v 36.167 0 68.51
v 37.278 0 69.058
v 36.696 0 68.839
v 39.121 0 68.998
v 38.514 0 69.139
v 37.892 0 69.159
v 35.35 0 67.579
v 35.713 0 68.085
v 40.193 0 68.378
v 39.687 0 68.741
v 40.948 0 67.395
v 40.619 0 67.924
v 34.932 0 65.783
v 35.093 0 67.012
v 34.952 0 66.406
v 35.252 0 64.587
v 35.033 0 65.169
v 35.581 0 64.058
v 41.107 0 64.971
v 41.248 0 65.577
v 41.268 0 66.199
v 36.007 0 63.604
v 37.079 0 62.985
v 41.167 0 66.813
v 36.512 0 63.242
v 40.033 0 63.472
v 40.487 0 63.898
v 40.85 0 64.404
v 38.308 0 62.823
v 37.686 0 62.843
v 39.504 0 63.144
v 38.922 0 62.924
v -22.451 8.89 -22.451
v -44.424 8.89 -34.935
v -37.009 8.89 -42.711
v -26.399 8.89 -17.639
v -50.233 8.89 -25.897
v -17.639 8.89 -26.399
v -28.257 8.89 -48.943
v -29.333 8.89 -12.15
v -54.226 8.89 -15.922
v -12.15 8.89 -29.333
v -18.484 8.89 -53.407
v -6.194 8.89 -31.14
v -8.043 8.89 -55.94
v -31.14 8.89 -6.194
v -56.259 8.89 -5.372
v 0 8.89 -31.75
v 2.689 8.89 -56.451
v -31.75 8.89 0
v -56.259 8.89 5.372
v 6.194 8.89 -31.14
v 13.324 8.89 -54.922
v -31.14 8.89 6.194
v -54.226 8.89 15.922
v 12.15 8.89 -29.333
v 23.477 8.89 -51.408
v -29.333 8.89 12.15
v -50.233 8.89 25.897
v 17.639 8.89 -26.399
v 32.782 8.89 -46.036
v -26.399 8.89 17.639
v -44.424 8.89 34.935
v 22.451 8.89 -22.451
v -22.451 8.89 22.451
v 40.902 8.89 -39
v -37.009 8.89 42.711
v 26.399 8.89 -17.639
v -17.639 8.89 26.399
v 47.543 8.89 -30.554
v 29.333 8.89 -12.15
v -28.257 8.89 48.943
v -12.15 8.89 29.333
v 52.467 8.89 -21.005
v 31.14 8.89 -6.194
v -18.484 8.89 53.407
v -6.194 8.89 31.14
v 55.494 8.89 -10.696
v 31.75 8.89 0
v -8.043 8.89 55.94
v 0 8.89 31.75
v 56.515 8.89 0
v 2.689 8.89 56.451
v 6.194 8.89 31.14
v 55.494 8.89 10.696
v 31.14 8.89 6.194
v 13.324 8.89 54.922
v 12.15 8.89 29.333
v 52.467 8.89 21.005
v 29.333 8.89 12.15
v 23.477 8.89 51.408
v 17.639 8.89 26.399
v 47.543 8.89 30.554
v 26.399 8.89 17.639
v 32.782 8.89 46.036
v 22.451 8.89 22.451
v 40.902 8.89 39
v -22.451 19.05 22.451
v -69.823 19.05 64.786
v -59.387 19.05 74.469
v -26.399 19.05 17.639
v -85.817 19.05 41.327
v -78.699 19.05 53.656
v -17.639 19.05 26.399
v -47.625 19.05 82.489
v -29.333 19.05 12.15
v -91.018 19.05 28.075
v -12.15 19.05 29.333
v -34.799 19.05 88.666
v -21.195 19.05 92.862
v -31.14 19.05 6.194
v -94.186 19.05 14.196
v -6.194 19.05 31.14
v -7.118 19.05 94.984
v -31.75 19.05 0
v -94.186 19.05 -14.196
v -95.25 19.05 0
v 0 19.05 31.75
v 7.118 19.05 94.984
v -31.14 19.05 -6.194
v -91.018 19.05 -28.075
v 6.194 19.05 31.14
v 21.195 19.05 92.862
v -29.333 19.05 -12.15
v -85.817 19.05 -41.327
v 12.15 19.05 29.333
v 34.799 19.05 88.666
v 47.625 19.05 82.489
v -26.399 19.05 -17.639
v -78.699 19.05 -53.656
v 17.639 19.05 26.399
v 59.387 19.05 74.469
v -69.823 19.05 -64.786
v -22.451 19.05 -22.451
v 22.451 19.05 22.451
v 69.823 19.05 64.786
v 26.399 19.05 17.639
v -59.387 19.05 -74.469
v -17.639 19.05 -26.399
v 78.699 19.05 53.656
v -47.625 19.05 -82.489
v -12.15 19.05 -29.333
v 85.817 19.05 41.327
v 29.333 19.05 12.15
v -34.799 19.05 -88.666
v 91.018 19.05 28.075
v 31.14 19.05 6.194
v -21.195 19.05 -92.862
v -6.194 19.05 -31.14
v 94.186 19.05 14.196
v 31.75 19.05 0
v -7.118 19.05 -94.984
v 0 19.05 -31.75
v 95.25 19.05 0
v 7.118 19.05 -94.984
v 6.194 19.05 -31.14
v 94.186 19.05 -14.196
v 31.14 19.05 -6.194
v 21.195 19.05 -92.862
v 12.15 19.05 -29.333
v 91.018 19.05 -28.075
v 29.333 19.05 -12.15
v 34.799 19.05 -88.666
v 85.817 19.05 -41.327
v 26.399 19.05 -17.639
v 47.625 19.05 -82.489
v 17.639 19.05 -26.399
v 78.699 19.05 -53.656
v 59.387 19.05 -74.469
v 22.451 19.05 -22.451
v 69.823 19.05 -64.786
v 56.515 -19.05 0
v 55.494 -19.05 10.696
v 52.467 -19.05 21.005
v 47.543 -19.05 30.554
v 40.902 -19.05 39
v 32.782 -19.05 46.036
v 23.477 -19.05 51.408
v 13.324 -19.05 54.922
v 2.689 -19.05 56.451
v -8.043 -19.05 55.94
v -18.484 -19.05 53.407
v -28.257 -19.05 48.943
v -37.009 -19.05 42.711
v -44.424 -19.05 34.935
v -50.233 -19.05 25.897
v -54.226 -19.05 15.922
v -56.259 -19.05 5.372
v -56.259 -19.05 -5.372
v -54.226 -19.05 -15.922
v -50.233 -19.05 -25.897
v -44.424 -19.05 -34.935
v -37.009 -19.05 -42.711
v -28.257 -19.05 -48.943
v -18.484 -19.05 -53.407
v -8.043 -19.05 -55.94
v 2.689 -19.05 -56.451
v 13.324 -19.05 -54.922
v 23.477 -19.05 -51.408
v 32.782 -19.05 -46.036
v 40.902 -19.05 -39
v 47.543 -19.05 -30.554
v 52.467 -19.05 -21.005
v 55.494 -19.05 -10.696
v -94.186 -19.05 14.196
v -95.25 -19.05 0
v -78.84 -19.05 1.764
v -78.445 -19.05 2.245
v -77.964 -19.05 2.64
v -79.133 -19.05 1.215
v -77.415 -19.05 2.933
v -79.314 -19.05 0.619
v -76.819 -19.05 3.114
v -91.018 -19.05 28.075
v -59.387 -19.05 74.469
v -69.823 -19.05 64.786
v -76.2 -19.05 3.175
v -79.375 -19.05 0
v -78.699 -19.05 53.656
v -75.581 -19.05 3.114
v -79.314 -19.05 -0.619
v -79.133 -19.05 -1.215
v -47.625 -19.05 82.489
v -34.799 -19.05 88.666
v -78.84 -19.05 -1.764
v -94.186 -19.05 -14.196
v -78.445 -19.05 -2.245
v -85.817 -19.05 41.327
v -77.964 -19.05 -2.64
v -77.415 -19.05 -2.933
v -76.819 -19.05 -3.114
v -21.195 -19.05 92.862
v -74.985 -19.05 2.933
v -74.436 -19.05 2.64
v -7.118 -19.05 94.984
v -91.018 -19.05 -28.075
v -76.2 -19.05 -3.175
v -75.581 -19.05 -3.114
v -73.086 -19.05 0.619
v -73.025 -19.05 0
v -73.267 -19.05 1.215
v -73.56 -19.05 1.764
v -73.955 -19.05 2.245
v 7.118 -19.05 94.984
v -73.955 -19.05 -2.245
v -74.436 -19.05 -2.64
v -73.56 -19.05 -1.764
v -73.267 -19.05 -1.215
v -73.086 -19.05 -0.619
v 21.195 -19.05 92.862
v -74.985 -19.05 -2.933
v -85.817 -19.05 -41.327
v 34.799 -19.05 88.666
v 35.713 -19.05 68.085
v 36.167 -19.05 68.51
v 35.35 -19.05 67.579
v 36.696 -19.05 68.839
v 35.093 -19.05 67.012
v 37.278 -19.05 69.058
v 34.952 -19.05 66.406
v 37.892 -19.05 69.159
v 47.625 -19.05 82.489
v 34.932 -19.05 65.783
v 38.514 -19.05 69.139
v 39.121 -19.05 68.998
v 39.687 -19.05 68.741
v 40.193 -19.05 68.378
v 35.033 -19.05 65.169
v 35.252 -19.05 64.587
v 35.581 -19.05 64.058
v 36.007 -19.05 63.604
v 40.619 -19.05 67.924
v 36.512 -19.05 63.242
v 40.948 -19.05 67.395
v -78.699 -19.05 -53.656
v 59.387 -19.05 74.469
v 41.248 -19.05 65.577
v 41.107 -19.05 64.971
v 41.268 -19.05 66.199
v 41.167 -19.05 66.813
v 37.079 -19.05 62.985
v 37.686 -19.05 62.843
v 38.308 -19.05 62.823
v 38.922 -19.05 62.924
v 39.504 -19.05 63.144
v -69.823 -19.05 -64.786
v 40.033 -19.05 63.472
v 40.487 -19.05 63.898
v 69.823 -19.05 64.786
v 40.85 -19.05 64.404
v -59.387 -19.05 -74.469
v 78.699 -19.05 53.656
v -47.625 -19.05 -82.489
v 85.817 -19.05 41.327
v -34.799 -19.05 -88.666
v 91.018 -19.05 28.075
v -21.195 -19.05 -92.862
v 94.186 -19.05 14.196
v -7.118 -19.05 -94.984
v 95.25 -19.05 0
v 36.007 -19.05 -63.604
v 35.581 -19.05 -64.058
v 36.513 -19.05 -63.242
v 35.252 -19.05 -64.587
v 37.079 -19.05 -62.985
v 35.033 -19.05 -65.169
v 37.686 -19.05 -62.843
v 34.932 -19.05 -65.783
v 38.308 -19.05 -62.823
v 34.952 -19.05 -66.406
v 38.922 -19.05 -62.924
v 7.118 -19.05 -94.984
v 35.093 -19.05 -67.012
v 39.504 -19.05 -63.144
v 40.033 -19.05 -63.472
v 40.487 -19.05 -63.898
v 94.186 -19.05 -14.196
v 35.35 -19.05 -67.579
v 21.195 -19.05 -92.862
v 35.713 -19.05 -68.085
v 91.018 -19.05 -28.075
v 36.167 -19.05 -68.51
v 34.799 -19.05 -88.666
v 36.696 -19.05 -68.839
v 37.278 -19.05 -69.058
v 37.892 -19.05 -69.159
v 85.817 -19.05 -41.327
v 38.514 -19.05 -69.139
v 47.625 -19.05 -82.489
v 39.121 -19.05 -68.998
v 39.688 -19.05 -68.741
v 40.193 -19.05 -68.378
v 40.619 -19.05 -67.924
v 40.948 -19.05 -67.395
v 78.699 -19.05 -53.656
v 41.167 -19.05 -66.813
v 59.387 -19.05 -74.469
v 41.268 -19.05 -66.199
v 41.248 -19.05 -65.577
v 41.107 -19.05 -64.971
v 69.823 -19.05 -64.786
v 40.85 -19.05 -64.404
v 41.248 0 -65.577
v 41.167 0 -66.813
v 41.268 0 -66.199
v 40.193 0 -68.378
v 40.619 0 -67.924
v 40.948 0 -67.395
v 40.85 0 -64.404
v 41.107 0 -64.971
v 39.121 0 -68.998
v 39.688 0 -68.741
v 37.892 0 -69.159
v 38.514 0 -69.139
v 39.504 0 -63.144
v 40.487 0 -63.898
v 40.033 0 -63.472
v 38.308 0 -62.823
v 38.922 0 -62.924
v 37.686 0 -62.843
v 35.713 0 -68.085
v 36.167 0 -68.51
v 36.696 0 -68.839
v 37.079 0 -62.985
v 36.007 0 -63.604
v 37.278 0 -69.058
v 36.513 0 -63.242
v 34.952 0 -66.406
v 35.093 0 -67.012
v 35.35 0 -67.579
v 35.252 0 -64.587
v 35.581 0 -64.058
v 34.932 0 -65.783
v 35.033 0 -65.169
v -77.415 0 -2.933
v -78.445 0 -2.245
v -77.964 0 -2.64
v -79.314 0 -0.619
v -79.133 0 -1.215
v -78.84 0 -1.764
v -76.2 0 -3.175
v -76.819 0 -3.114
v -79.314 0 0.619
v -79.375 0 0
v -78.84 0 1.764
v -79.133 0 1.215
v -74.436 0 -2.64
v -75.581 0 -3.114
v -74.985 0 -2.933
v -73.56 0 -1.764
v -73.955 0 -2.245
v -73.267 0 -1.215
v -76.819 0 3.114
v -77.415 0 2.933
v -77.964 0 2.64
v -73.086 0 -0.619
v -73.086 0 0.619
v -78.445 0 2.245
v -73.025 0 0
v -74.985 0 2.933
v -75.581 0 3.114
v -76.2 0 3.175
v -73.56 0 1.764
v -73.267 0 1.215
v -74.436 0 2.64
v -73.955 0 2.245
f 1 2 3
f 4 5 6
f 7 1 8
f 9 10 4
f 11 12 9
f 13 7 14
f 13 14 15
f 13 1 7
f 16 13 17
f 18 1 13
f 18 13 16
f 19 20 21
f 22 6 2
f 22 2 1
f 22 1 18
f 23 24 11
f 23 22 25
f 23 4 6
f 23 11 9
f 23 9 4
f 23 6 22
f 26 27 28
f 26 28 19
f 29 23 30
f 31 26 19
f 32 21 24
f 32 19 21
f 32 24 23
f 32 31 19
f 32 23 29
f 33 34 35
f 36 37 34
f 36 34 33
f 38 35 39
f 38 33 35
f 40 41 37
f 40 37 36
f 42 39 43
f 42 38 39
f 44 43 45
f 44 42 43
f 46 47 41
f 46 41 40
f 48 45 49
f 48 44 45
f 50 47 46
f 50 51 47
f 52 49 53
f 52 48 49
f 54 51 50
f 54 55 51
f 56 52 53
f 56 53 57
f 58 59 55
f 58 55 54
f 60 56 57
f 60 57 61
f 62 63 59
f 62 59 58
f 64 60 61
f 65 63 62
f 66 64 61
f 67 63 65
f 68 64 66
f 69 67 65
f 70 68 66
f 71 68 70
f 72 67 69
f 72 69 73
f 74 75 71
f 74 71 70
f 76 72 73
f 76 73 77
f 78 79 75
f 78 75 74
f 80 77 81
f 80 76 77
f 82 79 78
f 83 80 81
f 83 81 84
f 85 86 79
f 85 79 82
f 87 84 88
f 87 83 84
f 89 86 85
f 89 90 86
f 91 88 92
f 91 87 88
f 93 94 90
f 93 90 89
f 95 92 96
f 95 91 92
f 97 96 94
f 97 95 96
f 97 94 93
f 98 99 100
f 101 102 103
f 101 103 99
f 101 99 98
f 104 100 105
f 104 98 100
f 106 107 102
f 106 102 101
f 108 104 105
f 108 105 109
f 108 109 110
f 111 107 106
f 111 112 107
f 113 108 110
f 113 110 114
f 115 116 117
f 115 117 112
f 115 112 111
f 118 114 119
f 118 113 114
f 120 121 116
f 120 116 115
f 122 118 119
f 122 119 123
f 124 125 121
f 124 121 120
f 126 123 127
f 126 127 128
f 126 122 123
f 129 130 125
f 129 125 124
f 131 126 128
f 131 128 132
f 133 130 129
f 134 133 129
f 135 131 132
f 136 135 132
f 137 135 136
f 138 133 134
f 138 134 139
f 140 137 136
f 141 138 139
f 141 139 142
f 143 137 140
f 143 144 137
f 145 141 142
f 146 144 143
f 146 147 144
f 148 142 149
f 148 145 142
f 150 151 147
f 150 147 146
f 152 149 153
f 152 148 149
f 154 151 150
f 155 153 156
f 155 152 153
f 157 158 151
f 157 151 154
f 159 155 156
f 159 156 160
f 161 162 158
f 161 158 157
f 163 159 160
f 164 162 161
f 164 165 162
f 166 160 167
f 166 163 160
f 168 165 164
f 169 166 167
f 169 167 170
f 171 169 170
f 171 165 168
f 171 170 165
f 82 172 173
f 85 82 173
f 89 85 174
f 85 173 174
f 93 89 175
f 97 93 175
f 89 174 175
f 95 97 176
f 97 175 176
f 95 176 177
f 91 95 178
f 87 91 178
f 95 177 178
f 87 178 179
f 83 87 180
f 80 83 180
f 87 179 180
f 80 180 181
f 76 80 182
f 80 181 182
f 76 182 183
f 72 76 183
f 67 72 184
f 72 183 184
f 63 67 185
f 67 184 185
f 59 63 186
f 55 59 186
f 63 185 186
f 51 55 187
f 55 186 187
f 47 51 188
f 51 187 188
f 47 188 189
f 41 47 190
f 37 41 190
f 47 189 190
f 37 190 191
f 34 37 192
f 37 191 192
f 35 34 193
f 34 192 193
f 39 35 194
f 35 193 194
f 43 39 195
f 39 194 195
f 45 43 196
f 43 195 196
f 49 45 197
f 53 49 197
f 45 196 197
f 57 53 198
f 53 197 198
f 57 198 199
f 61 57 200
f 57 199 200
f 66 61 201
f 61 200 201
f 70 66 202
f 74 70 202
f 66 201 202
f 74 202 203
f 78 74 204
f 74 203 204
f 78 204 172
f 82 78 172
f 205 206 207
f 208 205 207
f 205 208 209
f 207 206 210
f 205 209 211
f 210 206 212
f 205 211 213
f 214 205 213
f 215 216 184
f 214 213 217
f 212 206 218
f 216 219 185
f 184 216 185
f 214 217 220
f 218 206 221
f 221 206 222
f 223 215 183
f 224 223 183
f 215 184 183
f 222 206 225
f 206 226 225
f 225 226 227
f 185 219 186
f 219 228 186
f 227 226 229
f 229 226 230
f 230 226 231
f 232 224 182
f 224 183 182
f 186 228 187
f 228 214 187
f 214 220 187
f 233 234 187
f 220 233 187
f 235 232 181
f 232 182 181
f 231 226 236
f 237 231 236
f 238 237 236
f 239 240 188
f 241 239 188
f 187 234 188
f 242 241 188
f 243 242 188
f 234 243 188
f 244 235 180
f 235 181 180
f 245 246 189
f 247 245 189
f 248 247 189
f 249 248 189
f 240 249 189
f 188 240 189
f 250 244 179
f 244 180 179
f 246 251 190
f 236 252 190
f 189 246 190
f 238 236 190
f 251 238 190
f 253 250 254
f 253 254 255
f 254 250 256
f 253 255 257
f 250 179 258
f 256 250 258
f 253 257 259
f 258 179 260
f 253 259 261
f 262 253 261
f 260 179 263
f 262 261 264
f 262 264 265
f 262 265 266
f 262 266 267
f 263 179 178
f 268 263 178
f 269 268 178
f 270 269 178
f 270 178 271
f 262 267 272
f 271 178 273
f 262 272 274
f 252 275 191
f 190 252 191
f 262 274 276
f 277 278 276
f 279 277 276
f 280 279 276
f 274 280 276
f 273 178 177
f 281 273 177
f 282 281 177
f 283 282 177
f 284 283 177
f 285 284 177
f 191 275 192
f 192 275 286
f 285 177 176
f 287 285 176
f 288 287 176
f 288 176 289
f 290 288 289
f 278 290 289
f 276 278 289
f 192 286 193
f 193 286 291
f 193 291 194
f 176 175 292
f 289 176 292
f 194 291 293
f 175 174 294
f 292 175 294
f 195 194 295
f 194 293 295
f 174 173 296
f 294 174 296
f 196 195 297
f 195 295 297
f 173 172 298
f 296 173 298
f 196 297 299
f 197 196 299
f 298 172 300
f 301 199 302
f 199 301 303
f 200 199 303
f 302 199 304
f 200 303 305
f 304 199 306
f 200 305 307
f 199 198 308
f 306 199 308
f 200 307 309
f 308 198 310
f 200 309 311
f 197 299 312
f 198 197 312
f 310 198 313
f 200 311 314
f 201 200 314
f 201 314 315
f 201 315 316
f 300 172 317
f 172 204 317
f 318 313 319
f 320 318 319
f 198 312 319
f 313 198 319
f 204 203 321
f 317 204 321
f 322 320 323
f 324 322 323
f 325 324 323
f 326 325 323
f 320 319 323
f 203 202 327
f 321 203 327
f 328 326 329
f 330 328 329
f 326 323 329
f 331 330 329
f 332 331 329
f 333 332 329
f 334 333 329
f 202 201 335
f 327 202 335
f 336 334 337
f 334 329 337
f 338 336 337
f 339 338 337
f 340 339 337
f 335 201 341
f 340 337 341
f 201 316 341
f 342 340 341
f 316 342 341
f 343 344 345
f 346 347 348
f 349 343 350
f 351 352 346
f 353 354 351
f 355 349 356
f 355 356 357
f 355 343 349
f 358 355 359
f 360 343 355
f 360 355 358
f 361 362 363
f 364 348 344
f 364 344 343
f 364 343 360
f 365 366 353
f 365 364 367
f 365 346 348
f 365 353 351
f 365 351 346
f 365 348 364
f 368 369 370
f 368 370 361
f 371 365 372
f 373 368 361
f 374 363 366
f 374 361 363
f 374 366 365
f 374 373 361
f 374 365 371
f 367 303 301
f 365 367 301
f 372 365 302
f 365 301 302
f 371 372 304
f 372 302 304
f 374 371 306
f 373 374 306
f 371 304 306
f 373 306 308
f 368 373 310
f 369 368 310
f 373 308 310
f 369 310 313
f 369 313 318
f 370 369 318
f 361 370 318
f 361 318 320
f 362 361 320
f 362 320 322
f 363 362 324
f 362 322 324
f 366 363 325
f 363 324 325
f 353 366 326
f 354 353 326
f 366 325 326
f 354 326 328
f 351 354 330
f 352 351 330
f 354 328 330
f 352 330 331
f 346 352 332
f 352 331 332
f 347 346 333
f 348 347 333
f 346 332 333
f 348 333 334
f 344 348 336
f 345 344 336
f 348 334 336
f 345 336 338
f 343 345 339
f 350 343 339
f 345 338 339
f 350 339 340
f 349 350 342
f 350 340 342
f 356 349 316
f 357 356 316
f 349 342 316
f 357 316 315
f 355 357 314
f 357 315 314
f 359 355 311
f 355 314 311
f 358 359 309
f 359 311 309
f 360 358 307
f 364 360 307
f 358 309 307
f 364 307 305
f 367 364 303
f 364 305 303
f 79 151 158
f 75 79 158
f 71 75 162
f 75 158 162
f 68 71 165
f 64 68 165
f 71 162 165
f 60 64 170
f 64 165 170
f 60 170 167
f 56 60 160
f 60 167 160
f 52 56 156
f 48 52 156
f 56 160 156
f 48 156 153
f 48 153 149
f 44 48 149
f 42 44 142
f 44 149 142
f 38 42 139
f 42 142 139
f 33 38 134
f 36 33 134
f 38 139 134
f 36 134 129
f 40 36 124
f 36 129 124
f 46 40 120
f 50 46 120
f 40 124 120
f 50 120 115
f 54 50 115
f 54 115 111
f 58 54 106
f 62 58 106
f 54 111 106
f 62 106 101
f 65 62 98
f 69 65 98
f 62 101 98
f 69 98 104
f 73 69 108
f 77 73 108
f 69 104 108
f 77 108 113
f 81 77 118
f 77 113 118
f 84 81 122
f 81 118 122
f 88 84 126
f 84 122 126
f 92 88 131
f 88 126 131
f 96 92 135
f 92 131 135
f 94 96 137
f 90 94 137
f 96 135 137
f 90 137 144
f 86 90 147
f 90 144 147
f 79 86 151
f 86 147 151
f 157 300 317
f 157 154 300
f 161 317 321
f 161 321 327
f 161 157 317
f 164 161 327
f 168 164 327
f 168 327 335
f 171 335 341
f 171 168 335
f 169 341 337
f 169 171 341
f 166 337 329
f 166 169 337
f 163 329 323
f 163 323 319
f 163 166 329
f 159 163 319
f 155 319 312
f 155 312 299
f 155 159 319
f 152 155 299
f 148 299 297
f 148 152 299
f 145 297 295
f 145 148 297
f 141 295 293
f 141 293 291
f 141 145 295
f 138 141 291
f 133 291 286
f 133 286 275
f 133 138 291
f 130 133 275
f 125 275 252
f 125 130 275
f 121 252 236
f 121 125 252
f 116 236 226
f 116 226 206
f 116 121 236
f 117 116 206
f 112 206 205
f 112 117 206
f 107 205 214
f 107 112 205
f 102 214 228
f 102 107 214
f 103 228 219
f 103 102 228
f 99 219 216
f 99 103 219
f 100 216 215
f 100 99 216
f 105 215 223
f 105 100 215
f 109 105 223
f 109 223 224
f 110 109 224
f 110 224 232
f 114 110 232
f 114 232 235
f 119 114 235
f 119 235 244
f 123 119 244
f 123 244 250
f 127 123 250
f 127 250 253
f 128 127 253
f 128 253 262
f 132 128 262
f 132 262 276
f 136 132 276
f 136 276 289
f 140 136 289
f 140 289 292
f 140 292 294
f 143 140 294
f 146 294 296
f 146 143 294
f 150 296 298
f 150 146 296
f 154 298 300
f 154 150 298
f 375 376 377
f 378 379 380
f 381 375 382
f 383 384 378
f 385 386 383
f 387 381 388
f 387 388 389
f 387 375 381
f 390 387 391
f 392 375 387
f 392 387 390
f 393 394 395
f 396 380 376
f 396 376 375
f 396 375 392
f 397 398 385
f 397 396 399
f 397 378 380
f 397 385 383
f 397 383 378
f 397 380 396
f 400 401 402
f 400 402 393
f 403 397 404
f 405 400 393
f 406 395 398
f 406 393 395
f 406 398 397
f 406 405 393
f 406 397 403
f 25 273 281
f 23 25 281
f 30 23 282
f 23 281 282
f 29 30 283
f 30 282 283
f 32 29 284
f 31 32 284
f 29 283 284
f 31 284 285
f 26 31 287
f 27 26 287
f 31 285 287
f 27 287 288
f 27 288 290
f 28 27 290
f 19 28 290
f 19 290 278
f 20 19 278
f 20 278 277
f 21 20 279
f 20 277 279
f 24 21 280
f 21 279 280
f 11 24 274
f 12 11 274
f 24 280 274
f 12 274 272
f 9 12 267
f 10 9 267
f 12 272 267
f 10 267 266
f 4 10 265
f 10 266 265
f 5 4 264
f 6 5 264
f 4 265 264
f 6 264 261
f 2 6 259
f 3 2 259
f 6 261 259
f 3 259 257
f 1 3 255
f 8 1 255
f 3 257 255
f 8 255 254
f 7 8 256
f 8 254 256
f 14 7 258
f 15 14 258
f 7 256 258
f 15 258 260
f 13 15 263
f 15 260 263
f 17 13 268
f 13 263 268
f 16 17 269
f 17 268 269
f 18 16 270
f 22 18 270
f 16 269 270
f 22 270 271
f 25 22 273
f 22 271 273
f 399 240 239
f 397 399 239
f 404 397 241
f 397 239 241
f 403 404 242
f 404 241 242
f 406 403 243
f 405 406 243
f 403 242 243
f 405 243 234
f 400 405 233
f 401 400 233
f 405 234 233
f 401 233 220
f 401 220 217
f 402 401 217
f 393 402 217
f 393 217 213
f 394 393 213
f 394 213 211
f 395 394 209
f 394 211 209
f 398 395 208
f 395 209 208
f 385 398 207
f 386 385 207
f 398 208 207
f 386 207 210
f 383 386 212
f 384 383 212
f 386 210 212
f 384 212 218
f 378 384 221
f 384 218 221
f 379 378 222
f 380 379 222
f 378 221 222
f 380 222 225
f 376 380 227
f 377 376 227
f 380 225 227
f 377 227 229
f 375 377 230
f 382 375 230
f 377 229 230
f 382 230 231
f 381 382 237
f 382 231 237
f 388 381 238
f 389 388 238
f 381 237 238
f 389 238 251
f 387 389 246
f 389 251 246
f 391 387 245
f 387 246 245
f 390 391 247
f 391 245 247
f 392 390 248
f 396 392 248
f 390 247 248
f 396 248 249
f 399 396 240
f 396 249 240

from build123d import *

# Parameters (mm, degrees)
SKETCH1_R           = 95.25
BOSS_EXTRUDE1_DEPTH = 19.05
SKETCH2_R           = 31.75
CUT_EXTRUDE1_DEPTH  = 10.16
SKETCH3_R           = 56.515
CUT_EXTRUDE2_DEPTH  = 27.94
SKETCH4_R           = 3.175
CUT_EXTRUDE3_DEPTH  = 19.05
CIRPATTERN1_COUNT   = 3


with BuildPart() as part:
    # Sketch1 → Boss-Extrude1 (new body, symmetric)
    with BuildSketch(Plane(origin=(0, 0, 0), x_dir=(1, 0, 0), z_dir=(0, 1, 0))):
        Circle(SKETCH1_R)
    extrude(amount=BOSS_EXTRUDE1_DEPTH, both=True)

    # Sketch2 → Cut-Extrude1 (cut)
    with BuildSketch(Plane(origin=(0, 19.05, 0), x_dir=(1, 0, 0), z_dir=(0, 1, 0))):
        Circle(SKETCH2_R)
    extrude(amount=-CUT_EXTRUDE1_DEPTH, mode=Mode.SUBTRACT)

    # Sketch3 → Cut-Extrude2 (cut)
    with BuildSketch(Plane.XZ.offset(19.05)):
        Circle(SKETCH3_R)
    extrude(amount=-CUT_EXTRUDE2_DEPTH, mode=Mode.SUBTRACT)

    # Sketch4 → Cut-Extrude3 (cut)
    with BuildSketch(Plane.XZ.offset(19.05)):
        with Locations((-76.2, 0)):
            Circle(SKETCH4_R)
    cut_extrude3 = extrude(amount=-CUT_EXTRUDE3_DEPTH, mode=Mode.SUBTRACT)

    # CirPattern1: Cut-Extrude3 ×3 about axis
    cirpattern1_axis = Axis((0, 0, 0), (0, 1, 0))
    for i in range(1, CIRPATTERN1_COUNT):
        add(cut_extrude3.rotate(cirpattern1_axis, i * 360 / CIRPATTERN1_COUNT), mode=Mode.SUBTRACT)


solid = part.part
